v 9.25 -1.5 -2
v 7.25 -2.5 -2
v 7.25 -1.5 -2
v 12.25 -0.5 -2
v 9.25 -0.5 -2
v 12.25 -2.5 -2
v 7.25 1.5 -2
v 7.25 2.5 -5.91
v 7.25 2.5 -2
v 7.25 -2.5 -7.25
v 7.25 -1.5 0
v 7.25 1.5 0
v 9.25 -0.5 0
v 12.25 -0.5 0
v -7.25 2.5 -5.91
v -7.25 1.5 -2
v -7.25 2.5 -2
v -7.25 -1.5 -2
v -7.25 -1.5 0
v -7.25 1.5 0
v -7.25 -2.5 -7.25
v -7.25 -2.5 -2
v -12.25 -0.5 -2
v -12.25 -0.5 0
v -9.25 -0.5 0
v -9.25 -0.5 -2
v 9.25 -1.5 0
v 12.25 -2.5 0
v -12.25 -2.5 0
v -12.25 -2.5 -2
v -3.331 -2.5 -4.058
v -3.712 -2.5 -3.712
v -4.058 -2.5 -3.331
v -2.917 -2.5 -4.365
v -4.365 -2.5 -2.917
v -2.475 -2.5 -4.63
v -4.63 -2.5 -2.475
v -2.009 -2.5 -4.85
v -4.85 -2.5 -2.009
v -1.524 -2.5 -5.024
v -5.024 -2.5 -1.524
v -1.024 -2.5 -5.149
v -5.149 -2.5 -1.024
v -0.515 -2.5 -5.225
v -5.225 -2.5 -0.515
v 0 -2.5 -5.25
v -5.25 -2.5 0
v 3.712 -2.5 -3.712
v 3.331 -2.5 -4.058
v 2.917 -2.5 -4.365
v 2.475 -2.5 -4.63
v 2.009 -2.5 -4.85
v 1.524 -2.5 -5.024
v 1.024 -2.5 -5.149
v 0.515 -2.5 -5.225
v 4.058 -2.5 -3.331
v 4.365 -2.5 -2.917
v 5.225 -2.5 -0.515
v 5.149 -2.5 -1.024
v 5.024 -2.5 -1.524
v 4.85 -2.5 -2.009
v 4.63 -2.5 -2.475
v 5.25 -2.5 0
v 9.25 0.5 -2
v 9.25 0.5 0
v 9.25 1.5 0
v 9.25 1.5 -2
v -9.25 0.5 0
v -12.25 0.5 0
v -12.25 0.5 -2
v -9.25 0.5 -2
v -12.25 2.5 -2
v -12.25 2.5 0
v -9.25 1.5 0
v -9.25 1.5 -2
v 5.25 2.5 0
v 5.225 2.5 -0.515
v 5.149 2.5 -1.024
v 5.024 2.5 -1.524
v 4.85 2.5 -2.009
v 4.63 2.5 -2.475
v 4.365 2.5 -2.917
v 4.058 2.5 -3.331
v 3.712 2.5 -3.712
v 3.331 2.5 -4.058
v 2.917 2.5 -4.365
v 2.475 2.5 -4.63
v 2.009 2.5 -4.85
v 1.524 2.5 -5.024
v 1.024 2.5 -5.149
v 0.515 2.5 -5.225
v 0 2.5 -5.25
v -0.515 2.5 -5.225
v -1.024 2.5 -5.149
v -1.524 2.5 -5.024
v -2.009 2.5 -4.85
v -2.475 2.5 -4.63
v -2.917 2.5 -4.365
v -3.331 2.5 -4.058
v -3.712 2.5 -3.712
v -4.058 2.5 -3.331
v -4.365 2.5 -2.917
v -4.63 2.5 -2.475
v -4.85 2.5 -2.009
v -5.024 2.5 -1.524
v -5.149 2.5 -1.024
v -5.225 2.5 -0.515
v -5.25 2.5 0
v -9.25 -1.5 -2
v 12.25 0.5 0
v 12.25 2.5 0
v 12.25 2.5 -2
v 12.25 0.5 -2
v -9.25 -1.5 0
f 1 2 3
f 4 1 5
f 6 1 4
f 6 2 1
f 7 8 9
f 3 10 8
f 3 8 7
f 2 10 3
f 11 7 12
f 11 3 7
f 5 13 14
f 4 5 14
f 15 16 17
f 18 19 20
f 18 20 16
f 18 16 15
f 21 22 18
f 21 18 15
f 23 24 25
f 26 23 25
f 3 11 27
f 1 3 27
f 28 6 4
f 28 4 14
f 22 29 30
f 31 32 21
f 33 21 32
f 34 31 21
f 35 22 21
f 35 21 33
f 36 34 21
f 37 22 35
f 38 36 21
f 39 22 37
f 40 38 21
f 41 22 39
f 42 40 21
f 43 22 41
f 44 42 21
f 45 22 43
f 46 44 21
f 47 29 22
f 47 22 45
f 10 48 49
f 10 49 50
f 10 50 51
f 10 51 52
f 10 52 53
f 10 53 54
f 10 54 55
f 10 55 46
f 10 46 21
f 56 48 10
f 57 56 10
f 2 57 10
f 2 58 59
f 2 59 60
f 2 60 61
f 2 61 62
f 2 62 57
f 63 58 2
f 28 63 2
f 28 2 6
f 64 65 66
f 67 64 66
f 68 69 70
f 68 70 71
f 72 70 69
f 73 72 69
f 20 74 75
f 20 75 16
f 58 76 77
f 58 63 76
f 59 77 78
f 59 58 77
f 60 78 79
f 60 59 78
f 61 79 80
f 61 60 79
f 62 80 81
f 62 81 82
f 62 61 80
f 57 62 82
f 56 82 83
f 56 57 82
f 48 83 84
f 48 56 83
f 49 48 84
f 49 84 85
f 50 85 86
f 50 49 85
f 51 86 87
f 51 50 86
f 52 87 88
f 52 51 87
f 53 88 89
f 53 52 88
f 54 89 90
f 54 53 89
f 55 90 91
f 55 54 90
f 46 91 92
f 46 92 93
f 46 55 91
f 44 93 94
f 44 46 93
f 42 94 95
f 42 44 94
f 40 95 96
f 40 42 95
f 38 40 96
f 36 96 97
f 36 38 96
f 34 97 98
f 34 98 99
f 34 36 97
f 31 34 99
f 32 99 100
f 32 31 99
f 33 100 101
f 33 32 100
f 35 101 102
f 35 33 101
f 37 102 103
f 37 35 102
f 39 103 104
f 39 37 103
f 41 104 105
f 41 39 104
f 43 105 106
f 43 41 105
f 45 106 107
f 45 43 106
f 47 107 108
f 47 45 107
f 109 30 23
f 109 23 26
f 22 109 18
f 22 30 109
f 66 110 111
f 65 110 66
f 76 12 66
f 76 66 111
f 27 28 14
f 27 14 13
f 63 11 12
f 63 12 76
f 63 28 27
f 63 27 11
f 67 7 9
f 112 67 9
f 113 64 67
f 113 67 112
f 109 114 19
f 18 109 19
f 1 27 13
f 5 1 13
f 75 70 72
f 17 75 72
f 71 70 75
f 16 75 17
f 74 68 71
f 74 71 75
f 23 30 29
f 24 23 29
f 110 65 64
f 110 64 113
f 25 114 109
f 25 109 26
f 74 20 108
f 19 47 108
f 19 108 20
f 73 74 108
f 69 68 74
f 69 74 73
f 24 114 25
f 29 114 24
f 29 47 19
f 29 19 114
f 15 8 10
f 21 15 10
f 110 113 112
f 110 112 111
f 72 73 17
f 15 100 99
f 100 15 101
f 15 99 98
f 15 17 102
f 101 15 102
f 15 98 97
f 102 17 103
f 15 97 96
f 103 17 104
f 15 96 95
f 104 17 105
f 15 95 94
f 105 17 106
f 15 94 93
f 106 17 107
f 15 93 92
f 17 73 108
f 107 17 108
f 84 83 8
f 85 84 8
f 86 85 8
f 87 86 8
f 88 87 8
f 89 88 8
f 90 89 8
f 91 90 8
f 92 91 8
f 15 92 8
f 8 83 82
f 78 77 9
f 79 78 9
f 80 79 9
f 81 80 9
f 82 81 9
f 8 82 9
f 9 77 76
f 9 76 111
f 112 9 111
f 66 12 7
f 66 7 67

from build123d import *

# Parameters (mm, degrees)
F0_W     = 5
F0_H     = 2
F1_DEPTH = 2.5
F2_W     = 3
F2_H     = 1
F2_W_2   = 2
F3_DEPTH = 25
F5_DEPTH = 25


with BuildPart() as f1:
    # F0 (on Front) → F1 (new body, symmetric)
    with BuildSketch(Plane.XZ):
        with BuildLine():
            ThreePointArc((5.25, 0), (0, -5.25), (-5.25, 0))
            Line((-5.25, 0), (-7.25, 0))
            ThreePointArc((-7.25, 0), (-5.126524, -5.126524), (0, -7.25))
            ThreePointArc((0, -7.25), (5.126524, -5.126524), (7.25, 0))
            Line((7.25, 0), (5.25, 0))
        make_face()
        with BuildLine():
            ThreePointArc((0, -7.25), (-5.126524, -5.126524), (-7.25, 0))
            Line((-7.25, 0), (-7.25, -2))
            Line((-7.25, -2), (-7.25, -7.25))
            Line((-7.25, -7.25), (0, -7.25))
        make_face()
        with Locations((-9.75, -1)):
            Rectangle(F0_W, F0_H)
        with BuildLine():
            Line((7.25, -2), (7.25, 0))
            ThreePointArc((7.25, 0), (5.126524, -5.126524), (0, -7.25))
            Line((0, -7.25), (7.25, -7.25))
            Line((7.25, -7.25), (7.25, -2))
        make_face()
        with Locations((9.75, -1)):
            Rectangle(F0_W, F0_H)
    extrude(amount=F1_DEPTH, both=True)

    # F2 (on Top) → F3 (cut)
    with BuildSketch(Plane.XY):
        with Locations((-10.75, 0)):
            Rectangle(F2_W, F2_H)
        with Locations((-8.25, 1)):
            Rectangle(F2_W_2, F2_H)
        with Locations((-8.25, 0)):
            Rectangle(F2_W_2, F2_H)
        with Locations((-8.25, -1)):
            Rectangle(F2_W_2, F2_H)
        with Locations((10.75, 0)):
            Rectangle(F2_W, F2_H)
        with Locations((8.25, 1)):
            Rectangle(F2_W_2, F2_H)
        with Locations((8.25, 0)):
            Rectangle(F2_W_2, F2_H)
        with Locations((8.25, -1)):
            Rectangle(F2_W_2, F2_H)
    extrude(amount=-F3_DEPTH, mode=Mode.SUBTRACT)

    # F4 (on face) → F5 (cut)
    with BuildSketch(Plane.YZ.offset(7.25)):
        Polygon((2.5, -7.25), (2.5, -5.910254), (-2.5, -7.25), align=None)
    extrude(amount=-F5_DEPTH, mode=Mode.SUBTRACT)


solid = f1.part
